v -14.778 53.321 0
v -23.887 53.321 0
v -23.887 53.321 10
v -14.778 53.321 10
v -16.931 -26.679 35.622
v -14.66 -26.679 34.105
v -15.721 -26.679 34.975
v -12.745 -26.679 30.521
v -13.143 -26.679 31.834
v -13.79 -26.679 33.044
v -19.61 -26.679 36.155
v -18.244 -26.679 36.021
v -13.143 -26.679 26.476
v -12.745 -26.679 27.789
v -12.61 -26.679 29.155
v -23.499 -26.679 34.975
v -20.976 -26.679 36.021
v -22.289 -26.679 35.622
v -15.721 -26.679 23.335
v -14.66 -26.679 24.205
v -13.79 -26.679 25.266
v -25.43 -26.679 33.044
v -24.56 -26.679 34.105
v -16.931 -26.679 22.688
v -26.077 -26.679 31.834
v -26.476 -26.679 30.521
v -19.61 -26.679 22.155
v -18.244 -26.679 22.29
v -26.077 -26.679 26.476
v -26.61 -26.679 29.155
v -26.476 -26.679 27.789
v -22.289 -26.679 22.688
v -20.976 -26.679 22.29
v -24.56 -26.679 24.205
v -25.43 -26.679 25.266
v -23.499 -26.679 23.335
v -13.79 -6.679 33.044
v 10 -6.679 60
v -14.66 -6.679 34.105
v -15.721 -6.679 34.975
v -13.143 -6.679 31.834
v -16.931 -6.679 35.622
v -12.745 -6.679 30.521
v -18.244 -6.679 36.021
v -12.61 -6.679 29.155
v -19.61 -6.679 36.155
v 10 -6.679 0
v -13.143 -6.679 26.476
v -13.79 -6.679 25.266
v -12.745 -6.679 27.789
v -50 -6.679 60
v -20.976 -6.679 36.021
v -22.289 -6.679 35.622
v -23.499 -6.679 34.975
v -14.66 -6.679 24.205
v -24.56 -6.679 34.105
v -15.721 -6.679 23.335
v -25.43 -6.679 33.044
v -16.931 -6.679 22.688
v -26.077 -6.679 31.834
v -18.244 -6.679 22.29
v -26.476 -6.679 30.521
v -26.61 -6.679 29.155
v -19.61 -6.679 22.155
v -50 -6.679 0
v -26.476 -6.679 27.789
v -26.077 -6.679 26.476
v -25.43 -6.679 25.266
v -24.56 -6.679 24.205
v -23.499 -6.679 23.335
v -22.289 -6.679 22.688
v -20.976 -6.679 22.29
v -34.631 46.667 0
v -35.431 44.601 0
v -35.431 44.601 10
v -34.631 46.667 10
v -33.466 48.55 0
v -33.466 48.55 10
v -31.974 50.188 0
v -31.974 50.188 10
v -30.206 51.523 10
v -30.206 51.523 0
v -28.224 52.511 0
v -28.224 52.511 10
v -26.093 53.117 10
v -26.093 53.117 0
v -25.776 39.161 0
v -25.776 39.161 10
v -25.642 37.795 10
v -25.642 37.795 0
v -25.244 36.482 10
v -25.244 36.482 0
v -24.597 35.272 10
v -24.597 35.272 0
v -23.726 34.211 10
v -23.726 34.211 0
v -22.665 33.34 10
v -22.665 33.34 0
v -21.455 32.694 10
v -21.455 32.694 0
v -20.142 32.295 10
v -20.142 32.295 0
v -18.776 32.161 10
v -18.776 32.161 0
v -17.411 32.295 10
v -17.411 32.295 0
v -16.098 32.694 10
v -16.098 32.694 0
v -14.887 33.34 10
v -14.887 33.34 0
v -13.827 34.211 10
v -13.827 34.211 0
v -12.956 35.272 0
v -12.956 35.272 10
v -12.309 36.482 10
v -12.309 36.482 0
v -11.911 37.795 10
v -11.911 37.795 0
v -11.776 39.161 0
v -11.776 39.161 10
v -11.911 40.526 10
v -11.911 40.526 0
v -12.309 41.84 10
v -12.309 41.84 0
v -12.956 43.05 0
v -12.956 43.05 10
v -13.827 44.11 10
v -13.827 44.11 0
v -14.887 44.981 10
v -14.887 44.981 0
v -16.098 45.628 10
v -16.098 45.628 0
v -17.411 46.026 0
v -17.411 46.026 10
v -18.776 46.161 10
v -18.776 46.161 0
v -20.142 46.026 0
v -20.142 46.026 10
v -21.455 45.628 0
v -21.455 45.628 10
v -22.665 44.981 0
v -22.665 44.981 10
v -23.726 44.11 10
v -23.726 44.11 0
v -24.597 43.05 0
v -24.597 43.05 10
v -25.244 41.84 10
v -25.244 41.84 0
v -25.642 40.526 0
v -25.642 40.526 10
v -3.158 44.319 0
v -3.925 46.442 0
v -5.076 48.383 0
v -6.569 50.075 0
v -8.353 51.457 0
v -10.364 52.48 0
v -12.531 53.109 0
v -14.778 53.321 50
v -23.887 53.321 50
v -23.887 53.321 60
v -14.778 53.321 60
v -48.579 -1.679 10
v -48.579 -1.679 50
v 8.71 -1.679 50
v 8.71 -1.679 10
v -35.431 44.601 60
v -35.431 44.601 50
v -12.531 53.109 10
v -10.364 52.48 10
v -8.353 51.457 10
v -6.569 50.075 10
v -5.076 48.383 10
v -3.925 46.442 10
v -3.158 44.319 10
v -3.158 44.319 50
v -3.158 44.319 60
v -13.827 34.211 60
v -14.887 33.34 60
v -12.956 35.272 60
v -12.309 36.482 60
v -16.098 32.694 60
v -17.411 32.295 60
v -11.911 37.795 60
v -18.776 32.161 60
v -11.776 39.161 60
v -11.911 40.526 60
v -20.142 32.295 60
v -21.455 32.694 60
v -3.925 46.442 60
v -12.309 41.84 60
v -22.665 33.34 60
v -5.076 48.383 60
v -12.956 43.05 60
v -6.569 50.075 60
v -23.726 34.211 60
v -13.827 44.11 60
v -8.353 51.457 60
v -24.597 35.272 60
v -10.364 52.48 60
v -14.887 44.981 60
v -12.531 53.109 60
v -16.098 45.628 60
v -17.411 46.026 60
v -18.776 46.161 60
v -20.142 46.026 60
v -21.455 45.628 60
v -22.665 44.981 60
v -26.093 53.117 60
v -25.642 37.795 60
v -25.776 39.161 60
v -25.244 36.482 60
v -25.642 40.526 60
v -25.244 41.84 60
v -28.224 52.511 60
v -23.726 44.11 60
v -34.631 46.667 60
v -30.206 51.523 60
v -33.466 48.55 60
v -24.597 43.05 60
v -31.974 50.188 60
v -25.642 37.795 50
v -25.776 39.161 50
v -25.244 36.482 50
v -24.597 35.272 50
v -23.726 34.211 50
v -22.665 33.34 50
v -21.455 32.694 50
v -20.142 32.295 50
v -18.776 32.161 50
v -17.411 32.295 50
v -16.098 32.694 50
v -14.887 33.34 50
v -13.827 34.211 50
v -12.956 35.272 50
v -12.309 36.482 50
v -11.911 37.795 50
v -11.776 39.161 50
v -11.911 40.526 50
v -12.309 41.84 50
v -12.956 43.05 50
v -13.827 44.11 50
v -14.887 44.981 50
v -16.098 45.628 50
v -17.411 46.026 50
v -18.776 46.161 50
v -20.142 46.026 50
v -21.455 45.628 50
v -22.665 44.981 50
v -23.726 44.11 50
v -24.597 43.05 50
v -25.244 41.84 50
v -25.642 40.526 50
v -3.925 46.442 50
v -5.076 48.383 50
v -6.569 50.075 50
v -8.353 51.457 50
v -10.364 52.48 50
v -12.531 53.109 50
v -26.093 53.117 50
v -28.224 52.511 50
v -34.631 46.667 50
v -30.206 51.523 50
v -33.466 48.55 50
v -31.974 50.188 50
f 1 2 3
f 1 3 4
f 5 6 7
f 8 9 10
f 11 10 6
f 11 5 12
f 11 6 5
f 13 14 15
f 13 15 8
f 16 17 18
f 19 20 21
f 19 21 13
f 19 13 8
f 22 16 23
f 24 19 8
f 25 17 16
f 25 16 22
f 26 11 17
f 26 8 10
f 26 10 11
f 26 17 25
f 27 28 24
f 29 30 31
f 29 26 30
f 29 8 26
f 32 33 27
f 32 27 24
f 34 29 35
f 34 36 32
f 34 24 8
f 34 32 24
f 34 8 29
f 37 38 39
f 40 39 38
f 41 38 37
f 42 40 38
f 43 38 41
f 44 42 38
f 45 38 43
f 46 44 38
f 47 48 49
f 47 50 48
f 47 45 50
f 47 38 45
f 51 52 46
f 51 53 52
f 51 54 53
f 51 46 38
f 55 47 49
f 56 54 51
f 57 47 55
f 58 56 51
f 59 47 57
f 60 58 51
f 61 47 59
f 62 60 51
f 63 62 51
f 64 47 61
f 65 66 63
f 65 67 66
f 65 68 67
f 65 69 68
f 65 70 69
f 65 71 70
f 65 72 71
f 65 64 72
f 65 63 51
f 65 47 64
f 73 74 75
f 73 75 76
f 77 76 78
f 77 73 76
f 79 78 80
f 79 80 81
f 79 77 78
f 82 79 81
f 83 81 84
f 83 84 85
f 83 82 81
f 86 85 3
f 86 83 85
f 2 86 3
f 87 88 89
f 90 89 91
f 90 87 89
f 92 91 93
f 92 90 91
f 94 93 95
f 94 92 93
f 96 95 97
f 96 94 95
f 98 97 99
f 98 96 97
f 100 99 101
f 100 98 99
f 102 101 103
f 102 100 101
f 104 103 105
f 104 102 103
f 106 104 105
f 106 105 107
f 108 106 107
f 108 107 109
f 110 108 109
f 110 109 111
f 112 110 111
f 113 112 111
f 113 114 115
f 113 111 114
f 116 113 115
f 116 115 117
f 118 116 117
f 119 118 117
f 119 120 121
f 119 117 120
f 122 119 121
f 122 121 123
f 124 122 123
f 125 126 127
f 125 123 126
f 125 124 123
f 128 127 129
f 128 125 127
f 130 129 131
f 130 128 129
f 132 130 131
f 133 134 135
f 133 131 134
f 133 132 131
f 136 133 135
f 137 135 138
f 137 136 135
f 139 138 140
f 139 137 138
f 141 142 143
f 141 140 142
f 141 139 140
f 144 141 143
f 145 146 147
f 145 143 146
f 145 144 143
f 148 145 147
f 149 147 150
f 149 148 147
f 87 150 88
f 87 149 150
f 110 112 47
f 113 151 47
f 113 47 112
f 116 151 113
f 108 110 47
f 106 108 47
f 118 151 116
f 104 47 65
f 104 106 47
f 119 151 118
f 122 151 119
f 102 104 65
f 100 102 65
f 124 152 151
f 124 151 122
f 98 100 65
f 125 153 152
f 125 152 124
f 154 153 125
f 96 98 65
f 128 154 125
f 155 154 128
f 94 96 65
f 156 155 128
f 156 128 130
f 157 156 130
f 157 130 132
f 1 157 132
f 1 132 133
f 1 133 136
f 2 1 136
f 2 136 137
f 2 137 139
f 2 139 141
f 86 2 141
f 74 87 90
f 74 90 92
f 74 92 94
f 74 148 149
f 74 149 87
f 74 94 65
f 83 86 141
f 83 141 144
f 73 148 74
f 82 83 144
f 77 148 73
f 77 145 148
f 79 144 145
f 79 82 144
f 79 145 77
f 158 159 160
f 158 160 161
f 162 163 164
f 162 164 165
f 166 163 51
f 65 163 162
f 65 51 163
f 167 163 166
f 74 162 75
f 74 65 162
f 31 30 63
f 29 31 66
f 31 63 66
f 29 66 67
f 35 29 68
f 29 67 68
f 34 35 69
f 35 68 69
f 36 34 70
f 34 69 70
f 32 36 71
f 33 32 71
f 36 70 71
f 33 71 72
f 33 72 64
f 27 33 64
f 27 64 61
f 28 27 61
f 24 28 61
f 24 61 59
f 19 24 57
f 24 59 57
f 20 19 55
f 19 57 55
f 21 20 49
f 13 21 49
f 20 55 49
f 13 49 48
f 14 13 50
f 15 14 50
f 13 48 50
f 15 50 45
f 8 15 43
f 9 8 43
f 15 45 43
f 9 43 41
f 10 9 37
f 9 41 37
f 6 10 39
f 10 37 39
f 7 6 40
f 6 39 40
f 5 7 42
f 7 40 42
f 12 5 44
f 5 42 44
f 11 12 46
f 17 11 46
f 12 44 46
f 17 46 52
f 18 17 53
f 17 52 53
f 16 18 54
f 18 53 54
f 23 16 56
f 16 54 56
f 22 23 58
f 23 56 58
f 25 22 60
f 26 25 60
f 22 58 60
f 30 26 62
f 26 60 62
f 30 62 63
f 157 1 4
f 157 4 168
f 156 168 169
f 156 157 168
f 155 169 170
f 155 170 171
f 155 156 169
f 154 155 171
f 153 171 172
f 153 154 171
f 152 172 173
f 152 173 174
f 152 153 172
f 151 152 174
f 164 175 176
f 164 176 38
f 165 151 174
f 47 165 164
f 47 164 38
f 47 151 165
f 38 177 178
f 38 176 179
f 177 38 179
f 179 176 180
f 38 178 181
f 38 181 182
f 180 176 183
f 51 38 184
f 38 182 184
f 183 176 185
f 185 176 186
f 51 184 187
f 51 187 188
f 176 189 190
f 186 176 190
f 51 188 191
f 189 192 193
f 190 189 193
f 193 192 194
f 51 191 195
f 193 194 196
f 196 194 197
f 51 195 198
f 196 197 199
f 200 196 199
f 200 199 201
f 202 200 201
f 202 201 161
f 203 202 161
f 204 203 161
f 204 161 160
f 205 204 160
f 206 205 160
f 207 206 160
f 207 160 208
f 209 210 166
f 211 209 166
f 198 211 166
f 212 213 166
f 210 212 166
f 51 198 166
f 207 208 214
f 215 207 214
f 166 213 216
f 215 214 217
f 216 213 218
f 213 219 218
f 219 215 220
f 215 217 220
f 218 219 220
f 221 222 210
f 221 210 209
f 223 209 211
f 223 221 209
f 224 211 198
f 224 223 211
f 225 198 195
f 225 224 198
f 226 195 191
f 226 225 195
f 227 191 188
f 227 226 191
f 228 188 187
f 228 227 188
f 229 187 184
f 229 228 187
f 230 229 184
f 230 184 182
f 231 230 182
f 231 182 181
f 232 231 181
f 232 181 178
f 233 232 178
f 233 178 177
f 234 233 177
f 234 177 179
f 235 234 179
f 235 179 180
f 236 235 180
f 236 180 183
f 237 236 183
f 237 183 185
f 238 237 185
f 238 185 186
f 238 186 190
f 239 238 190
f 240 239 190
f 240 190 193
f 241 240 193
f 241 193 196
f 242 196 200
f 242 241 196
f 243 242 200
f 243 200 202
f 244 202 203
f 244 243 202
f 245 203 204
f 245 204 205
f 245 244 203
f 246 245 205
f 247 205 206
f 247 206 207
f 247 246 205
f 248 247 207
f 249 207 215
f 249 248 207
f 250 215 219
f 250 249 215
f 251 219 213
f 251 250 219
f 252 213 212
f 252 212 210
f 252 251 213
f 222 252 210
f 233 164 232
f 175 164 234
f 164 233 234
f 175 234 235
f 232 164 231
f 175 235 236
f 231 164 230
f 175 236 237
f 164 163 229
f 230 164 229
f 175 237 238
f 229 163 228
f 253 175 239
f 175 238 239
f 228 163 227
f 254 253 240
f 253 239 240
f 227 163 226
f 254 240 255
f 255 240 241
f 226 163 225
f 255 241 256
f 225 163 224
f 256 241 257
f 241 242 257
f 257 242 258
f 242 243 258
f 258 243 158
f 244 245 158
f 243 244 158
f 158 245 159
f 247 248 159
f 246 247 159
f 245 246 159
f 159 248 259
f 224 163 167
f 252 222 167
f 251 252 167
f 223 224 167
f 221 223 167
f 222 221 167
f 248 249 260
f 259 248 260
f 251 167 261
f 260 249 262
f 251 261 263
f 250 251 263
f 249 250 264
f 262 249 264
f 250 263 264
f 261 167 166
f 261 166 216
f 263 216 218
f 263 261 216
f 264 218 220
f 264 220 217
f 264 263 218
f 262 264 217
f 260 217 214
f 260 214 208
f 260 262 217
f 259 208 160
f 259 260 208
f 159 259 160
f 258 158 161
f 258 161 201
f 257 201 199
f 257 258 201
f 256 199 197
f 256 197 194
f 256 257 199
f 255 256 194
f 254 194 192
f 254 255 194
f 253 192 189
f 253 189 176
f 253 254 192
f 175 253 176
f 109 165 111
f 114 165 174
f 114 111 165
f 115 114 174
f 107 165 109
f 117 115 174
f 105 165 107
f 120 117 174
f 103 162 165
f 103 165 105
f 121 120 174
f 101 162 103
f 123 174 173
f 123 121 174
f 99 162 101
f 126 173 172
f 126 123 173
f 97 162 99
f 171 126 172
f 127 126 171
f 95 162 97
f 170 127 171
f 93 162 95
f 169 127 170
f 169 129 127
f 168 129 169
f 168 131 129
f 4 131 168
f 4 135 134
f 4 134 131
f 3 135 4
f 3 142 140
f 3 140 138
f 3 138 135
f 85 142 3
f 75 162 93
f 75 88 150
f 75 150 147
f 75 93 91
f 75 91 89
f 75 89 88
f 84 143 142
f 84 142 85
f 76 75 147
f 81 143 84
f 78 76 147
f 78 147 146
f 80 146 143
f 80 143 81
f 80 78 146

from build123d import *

# Parameters (mm, degrees)
CROQUIS1_R                 = 7
SALIENTE_EXTRUIR1_DEPTH    = 60
CORTAR_EXTRUIR1_DEPTH      = 95.568349883
CORTAR_EXTRUIR1_DEPTH_BACK = 95.568349883
CROQUIS2_W                 = 40
CROQUIS2_H                 = 110
CROQUIS3_R                 = 7
SALIENTE_EXTRUIR2_DEPTH    = 20


with BuildPart() as part:
    # Croquis1 → Saliente-Extruir1 (new body)
    with BuildSketch(Plane.XY):
        with BuildLine():
            Line((-50, -6.678589669), (-35.430635455, 44.601005707))
            ThreePointArc((-35.430635455, 44.601005707), (-31.120912301, 50.896250917), (-23.887487957, 53.321410331))
            Line((-23.887487957, 53.321410331), (-14.777953394, 53.321410331))
            ThreePointArc((-14.777953394, 53.321410331), (-7.428687176, 50.807625912), (-3.158499443, 44.319458007))
            Line((-3.158499443, 44.319458007), (10, -6.678589669))
            Line((10, -6.678589669), (-50, -6.678589669))
        make_face()
        with Locations(Location((-18.776351085, 39.16072457, 0), (0, 0, 180))):
            Circle(CROQUIS1_R, mode=Mode.SUBTRACT)
    extrude(amount=SALIENTE_EXTRUIR1_DEPTH)

    # Croquis2 → Cortar-Extruir1 (cut, two sides: drawn at the far end of the back side and taken through both)
    with BuildSketch(Plane(origin=(0, 0, 0), x_dir=(0, 0, -1), z_dir=(1, 0, 0)).offset(-CORTAR_EXTRUIR1_DEPTH_BACK)):
        with Locations((-30, 53.321410331)):
            Rectangle(CROQUIS2_W, CROQUIS2_H)
    extrude(amount=CORTAR_EXTRUIR1_DEPTH + CORTAR_EXTRUIR1_DEPTH_BACK, mode=Mode.SUBTRACT)

    # Croquis3 → Saliente-Extruir2 (add)
    with BuildSketch(Plane.XZ.offset(6.678589669)):
        with Locations(Location((-19.610005653, 29.155012249, 0), (0, 0, 180))):
            Circle(CROQUIS3_R)
    extrude(amount=SALIENTE_EXTRUIR2_DEPTH)


solid = part.part
